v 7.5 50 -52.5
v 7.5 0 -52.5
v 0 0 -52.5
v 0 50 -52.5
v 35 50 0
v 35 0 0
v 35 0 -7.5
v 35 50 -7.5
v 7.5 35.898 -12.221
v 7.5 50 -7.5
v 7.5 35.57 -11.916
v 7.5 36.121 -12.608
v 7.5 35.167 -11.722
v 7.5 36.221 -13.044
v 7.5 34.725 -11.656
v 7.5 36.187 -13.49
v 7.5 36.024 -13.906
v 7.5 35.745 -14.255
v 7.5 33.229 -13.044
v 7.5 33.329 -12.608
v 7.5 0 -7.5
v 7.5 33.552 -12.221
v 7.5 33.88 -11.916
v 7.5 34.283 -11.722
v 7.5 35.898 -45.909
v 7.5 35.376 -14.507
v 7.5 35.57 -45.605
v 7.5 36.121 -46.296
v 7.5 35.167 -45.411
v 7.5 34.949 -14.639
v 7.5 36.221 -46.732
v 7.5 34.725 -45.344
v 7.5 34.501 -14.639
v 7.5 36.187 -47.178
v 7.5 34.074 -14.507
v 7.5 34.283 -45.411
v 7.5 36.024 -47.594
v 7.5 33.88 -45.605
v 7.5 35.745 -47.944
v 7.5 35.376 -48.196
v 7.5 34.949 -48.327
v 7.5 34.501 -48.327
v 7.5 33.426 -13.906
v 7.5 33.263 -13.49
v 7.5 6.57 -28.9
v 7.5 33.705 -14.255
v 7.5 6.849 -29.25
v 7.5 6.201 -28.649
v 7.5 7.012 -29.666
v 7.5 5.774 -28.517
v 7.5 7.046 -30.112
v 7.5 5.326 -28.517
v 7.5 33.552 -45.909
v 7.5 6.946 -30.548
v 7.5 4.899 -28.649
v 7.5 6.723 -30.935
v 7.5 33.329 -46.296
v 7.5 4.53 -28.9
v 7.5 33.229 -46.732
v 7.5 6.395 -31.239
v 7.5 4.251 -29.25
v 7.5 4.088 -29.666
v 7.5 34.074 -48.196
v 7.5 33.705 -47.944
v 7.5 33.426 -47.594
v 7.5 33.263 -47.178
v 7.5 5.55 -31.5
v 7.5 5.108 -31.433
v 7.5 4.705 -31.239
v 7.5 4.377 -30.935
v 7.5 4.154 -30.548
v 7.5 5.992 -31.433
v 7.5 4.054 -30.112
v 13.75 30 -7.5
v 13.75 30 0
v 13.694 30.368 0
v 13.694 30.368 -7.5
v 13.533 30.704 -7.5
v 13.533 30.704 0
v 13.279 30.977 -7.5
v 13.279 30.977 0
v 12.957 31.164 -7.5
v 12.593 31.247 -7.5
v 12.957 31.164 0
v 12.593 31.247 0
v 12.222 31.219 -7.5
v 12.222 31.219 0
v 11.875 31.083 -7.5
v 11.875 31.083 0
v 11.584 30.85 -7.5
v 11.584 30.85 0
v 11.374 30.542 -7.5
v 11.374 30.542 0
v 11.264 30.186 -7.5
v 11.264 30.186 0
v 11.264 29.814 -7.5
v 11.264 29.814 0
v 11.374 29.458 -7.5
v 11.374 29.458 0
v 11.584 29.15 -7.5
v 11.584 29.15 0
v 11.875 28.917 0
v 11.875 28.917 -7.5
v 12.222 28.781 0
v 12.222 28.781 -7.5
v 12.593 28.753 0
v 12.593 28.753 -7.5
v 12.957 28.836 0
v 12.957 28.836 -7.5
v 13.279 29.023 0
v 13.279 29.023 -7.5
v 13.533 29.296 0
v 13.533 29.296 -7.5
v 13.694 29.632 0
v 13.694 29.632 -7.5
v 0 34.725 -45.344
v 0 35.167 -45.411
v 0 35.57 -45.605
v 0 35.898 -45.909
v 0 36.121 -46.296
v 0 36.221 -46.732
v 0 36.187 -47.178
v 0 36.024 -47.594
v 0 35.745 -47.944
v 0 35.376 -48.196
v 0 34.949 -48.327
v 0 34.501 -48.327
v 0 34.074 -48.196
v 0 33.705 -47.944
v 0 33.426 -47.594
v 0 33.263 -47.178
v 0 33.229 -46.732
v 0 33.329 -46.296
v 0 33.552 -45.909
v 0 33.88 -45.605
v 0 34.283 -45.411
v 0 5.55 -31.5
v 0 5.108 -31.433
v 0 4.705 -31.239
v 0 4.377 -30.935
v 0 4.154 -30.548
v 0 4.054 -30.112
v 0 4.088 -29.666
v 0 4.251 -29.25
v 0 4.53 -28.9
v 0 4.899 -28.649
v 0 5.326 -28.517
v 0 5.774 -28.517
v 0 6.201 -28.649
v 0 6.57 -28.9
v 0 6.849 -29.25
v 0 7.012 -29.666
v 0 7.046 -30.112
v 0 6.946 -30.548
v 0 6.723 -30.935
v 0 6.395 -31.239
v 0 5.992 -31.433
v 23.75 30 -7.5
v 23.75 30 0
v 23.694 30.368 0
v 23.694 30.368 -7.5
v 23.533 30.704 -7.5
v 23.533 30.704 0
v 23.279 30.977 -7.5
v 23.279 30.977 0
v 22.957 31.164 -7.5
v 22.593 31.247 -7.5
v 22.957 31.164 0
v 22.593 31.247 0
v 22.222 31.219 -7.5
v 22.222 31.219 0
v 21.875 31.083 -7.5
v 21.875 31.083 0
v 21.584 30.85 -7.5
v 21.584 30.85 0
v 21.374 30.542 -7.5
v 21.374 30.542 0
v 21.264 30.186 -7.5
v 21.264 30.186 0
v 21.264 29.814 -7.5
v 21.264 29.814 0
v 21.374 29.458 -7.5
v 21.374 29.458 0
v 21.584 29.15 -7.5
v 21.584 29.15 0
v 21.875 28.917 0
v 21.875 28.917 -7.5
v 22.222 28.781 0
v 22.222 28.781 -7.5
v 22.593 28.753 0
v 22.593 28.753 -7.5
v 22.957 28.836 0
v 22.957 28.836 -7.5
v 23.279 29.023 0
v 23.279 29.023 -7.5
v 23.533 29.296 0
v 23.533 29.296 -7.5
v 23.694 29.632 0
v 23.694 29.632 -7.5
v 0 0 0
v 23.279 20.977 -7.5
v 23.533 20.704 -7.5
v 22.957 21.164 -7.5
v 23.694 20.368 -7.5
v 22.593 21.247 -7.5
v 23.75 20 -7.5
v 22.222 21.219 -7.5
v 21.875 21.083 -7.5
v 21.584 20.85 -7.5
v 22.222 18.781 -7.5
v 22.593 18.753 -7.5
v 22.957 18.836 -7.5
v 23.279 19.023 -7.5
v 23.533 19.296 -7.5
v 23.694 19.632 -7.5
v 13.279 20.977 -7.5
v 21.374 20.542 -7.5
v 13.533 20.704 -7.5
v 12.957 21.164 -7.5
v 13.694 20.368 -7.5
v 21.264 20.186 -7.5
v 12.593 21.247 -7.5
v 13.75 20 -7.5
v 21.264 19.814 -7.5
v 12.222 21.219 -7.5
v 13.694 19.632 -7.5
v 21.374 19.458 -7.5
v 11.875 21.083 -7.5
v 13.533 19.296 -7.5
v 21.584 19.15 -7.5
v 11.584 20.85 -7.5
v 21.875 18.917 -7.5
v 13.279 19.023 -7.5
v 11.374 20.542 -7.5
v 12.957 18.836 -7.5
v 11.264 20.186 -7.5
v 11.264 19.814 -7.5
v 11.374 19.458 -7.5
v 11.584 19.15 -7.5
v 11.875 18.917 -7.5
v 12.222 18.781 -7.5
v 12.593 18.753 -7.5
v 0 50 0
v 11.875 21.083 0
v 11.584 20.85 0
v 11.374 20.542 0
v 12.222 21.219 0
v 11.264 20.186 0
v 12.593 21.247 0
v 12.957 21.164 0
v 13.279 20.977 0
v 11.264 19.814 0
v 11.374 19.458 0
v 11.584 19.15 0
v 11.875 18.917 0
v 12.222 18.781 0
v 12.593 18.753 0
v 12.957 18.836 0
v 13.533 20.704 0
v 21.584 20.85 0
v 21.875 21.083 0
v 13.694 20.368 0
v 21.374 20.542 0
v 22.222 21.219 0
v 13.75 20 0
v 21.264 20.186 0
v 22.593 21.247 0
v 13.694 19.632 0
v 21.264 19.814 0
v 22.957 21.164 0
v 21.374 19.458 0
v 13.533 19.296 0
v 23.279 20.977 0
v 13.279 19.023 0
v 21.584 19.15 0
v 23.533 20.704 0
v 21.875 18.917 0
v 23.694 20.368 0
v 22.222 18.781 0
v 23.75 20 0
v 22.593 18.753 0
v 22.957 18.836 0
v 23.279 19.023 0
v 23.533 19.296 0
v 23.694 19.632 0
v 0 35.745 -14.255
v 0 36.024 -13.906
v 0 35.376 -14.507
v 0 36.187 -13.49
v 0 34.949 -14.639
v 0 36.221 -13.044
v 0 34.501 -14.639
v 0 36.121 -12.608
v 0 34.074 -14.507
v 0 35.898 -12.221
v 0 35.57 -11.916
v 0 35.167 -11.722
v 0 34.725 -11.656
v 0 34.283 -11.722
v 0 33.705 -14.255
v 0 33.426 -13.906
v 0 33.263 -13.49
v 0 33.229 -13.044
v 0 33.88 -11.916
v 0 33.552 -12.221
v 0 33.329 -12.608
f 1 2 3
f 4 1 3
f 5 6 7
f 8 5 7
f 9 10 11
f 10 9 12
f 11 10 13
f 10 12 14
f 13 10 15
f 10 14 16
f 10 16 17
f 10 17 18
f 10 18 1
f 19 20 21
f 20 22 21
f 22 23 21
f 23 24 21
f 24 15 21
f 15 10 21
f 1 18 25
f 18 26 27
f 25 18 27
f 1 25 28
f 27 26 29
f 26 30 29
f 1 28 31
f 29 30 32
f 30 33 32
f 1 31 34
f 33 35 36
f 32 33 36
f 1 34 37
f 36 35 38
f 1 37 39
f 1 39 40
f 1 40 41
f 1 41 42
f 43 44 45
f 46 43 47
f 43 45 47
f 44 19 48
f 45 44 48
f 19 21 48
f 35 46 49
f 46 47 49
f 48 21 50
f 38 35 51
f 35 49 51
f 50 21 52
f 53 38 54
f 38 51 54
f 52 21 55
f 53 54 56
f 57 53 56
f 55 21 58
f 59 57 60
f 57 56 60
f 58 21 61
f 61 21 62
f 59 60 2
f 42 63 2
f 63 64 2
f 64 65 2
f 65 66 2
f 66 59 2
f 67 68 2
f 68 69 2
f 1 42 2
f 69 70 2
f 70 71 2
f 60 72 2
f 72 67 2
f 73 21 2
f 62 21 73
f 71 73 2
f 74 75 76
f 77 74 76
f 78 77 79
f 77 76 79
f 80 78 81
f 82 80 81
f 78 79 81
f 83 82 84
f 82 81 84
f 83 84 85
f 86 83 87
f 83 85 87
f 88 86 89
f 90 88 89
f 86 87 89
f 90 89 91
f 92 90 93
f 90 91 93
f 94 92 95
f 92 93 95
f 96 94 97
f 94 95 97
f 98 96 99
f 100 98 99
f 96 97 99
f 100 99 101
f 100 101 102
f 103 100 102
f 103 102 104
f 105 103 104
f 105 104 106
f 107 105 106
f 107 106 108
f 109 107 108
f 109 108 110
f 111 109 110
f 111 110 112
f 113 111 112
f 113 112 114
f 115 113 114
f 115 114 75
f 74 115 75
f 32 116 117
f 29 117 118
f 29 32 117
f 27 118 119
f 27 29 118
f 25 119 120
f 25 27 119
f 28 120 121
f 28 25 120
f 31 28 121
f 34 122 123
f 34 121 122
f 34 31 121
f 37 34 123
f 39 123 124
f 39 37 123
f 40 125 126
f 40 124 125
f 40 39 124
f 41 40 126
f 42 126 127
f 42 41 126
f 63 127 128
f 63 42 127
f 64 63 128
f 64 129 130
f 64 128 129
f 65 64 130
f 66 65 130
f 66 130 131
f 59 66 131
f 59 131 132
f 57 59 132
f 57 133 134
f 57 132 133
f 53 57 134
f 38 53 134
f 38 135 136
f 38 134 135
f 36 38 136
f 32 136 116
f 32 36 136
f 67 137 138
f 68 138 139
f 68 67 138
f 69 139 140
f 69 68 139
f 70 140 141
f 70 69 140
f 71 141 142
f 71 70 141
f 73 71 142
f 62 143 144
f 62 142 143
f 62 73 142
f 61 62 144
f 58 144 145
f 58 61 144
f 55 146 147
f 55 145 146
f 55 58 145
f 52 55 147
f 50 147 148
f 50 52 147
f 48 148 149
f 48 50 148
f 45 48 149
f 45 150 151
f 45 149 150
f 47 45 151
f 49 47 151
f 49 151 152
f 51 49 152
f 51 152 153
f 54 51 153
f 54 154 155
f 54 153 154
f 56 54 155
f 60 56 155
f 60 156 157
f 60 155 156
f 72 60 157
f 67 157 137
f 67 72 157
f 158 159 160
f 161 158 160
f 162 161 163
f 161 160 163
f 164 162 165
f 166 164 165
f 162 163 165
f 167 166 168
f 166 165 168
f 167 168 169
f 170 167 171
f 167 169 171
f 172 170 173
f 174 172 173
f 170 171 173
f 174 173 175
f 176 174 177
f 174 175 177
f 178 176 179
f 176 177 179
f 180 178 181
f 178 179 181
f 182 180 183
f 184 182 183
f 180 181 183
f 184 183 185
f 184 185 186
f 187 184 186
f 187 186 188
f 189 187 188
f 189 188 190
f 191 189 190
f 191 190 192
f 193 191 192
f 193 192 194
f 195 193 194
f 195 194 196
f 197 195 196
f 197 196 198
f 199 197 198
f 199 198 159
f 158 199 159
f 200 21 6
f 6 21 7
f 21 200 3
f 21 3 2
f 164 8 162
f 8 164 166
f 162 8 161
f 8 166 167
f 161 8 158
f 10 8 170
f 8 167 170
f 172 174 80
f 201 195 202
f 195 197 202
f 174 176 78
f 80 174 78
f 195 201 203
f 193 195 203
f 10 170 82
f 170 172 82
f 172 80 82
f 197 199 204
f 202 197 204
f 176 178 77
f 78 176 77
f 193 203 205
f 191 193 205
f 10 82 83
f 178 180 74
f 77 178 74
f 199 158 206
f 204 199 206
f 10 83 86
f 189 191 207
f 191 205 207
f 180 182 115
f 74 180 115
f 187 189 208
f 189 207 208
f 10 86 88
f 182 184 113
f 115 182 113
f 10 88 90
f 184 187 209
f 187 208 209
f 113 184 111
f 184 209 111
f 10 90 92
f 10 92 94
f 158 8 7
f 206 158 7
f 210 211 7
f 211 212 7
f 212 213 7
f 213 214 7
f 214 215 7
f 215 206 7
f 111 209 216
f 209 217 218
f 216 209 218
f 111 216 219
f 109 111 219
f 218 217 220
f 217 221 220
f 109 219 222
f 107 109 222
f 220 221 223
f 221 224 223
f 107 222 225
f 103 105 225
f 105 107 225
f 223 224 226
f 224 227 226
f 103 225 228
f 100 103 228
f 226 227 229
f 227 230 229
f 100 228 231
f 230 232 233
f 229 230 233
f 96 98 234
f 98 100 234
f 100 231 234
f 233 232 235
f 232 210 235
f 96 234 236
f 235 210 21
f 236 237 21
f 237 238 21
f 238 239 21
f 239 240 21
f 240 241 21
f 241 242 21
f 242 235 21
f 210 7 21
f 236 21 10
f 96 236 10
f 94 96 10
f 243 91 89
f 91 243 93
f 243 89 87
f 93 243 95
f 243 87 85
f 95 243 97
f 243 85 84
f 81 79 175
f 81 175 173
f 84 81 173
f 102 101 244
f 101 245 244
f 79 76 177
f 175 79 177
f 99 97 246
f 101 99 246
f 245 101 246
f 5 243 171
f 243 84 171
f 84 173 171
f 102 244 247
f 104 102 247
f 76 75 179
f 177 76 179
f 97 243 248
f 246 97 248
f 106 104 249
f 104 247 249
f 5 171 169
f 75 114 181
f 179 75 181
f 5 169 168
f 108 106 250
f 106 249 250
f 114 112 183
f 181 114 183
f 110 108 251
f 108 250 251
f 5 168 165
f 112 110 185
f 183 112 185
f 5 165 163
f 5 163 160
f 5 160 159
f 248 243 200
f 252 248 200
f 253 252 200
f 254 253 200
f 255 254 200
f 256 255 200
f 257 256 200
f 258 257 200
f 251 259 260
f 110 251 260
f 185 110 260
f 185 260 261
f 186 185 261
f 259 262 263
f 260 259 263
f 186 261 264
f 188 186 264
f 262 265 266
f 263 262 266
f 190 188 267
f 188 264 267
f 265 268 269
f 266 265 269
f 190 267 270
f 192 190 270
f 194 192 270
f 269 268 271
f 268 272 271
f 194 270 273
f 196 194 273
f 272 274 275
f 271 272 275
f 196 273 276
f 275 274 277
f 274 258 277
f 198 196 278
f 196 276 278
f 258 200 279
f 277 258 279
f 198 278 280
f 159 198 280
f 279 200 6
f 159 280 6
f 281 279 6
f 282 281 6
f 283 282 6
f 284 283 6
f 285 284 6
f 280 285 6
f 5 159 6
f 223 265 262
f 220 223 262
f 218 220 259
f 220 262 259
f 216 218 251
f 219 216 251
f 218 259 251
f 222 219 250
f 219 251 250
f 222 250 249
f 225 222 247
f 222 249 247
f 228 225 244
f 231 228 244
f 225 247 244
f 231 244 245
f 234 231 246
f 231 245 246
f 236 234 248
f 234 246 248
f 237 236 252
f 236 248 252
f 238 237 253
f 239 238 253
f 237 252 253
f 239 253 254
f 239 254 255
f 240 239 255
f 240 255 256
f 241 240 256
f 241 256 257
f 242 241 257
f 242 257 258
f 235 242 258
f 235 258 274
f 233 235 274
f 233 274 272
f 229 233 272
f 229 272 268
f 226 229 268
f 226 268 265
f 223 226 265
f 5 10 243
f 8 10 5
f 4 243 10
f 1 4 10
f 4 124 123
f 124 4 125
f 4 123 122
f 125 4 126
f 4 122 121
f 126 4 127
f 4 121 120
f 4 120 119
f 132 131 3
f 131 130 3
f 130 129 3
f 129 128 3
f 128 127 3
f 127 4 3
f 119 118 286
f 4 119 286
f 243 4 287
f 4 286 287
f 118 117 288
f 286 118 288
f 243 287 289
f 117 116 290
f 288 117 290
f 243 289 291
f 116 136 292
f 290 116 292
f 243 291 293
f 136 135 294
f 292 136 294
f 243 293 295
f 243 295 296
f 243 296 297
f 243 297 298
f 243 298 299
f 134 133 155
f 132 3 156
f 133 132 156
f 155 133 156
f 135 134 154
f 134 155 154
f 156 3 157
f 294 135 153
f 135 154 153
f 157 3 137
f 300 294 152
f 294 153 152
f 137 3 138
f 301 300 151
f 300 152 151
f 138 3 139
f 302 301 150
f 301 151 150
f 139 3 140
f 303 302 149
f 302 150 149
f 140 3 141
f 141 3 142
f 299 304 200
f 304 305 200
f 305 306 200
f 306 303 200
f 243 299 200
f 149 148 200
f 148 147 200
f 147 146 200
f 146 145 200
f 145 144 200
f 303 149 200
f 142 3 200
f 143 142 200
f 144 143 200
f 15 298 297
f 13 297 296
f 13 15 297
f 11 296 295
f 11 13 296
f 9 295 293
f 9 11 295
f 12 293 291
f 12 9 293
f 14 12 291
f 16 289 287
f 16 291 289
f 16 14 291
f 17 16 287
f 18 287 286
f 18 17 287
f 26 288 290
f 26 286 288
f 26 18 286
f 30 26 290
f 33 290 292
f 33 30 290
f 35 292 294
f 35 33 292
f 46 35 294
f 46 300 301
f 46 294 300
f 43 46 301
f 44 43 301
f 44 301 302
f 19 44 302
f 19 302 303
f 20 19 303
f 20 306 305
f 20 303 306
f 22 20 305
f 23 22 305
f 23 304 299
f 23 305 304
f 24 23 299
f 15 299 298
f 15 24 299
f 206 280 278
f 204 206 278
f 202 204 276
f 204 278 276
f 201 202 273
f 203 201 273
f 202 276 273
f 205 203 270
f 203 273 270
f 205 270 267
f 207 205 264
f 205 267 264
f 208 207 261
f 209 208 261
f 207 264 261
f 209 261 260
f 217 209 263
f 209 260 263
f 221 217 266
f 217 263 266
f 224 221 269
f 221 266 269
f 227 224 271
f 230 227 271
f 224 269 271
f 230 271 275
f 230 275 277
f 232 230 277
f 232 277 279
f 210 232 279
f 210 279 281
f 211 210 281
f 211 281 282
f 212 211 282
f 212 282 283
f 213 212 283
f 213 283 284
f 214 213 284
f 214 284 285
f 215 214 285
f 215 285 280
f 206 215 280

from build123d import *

# Parameters (mm, degrees)
BOSS_EXTRU_1_DEPTH      = 50
ESQUISSE2_R             = 1.25
ENL_V_MAT_EXTRU_1_DEPTH = 37.5
ESQUISSE3_R             = 1.5
ENL_V_MAT_EXTRU_2_DEPTH = 13.5


with BuildPart() as part:
    # Esquisse1 → Boss.-Extru.1 (new body)
    with BuildSketch(Plane(origin=(0, 0, 0), x_dir=(1, 0, 0), z_dir=(0, 1, 0))):
        Polygon((0, 0), (35, 0), (35, 7.5), (7.5, 7.5), (7.5, 52.5), (0, 52.5), align=None)
    extrude(amount=BOSS_EXTRU_1_DEPTH)

    # Esquisse2 → Enlèv. mat.-Extru.1 (cut)
    with BuildSketch(Plane.XY):
        with Locations((22.5, 30)):
            Circle(ESQUISSE2_R)
        with Locations((22.5, 20)):
            Circle(ESQUISSE2_R)
        with Locations((12.5, 20)):
            Circle(ESQUISSE2_R)
        with Locations((12.5, 30)):
            Circle(ESQUISSE2_R)
    extrude(amount=-ENL_V_MAT_EXTRU_1_DEPTH, mode=Mode.SUBTRACT)

    # Esquisse3 → Enlèv. mat.-Extru.2 (cut)
    with BuildSketch(Plane.ZY.offset(-7.5)):
        with Locations(Location((-30, 5.55, 0), (0, 0, 180))):
            Circle(ESQUISSE3_R)
        with Locations((-46.844194104, 34.725)):
            Circle(ESQUISSE3_R)
        with Locations((-13.155805896, 34.725)):
            Circle(ESQUISSE3_R)
    extrude(amount=ENL_V_MAT_EXTRU_2_DEPTH, mode=Mode.SUBTRACT)


solid = part.part
